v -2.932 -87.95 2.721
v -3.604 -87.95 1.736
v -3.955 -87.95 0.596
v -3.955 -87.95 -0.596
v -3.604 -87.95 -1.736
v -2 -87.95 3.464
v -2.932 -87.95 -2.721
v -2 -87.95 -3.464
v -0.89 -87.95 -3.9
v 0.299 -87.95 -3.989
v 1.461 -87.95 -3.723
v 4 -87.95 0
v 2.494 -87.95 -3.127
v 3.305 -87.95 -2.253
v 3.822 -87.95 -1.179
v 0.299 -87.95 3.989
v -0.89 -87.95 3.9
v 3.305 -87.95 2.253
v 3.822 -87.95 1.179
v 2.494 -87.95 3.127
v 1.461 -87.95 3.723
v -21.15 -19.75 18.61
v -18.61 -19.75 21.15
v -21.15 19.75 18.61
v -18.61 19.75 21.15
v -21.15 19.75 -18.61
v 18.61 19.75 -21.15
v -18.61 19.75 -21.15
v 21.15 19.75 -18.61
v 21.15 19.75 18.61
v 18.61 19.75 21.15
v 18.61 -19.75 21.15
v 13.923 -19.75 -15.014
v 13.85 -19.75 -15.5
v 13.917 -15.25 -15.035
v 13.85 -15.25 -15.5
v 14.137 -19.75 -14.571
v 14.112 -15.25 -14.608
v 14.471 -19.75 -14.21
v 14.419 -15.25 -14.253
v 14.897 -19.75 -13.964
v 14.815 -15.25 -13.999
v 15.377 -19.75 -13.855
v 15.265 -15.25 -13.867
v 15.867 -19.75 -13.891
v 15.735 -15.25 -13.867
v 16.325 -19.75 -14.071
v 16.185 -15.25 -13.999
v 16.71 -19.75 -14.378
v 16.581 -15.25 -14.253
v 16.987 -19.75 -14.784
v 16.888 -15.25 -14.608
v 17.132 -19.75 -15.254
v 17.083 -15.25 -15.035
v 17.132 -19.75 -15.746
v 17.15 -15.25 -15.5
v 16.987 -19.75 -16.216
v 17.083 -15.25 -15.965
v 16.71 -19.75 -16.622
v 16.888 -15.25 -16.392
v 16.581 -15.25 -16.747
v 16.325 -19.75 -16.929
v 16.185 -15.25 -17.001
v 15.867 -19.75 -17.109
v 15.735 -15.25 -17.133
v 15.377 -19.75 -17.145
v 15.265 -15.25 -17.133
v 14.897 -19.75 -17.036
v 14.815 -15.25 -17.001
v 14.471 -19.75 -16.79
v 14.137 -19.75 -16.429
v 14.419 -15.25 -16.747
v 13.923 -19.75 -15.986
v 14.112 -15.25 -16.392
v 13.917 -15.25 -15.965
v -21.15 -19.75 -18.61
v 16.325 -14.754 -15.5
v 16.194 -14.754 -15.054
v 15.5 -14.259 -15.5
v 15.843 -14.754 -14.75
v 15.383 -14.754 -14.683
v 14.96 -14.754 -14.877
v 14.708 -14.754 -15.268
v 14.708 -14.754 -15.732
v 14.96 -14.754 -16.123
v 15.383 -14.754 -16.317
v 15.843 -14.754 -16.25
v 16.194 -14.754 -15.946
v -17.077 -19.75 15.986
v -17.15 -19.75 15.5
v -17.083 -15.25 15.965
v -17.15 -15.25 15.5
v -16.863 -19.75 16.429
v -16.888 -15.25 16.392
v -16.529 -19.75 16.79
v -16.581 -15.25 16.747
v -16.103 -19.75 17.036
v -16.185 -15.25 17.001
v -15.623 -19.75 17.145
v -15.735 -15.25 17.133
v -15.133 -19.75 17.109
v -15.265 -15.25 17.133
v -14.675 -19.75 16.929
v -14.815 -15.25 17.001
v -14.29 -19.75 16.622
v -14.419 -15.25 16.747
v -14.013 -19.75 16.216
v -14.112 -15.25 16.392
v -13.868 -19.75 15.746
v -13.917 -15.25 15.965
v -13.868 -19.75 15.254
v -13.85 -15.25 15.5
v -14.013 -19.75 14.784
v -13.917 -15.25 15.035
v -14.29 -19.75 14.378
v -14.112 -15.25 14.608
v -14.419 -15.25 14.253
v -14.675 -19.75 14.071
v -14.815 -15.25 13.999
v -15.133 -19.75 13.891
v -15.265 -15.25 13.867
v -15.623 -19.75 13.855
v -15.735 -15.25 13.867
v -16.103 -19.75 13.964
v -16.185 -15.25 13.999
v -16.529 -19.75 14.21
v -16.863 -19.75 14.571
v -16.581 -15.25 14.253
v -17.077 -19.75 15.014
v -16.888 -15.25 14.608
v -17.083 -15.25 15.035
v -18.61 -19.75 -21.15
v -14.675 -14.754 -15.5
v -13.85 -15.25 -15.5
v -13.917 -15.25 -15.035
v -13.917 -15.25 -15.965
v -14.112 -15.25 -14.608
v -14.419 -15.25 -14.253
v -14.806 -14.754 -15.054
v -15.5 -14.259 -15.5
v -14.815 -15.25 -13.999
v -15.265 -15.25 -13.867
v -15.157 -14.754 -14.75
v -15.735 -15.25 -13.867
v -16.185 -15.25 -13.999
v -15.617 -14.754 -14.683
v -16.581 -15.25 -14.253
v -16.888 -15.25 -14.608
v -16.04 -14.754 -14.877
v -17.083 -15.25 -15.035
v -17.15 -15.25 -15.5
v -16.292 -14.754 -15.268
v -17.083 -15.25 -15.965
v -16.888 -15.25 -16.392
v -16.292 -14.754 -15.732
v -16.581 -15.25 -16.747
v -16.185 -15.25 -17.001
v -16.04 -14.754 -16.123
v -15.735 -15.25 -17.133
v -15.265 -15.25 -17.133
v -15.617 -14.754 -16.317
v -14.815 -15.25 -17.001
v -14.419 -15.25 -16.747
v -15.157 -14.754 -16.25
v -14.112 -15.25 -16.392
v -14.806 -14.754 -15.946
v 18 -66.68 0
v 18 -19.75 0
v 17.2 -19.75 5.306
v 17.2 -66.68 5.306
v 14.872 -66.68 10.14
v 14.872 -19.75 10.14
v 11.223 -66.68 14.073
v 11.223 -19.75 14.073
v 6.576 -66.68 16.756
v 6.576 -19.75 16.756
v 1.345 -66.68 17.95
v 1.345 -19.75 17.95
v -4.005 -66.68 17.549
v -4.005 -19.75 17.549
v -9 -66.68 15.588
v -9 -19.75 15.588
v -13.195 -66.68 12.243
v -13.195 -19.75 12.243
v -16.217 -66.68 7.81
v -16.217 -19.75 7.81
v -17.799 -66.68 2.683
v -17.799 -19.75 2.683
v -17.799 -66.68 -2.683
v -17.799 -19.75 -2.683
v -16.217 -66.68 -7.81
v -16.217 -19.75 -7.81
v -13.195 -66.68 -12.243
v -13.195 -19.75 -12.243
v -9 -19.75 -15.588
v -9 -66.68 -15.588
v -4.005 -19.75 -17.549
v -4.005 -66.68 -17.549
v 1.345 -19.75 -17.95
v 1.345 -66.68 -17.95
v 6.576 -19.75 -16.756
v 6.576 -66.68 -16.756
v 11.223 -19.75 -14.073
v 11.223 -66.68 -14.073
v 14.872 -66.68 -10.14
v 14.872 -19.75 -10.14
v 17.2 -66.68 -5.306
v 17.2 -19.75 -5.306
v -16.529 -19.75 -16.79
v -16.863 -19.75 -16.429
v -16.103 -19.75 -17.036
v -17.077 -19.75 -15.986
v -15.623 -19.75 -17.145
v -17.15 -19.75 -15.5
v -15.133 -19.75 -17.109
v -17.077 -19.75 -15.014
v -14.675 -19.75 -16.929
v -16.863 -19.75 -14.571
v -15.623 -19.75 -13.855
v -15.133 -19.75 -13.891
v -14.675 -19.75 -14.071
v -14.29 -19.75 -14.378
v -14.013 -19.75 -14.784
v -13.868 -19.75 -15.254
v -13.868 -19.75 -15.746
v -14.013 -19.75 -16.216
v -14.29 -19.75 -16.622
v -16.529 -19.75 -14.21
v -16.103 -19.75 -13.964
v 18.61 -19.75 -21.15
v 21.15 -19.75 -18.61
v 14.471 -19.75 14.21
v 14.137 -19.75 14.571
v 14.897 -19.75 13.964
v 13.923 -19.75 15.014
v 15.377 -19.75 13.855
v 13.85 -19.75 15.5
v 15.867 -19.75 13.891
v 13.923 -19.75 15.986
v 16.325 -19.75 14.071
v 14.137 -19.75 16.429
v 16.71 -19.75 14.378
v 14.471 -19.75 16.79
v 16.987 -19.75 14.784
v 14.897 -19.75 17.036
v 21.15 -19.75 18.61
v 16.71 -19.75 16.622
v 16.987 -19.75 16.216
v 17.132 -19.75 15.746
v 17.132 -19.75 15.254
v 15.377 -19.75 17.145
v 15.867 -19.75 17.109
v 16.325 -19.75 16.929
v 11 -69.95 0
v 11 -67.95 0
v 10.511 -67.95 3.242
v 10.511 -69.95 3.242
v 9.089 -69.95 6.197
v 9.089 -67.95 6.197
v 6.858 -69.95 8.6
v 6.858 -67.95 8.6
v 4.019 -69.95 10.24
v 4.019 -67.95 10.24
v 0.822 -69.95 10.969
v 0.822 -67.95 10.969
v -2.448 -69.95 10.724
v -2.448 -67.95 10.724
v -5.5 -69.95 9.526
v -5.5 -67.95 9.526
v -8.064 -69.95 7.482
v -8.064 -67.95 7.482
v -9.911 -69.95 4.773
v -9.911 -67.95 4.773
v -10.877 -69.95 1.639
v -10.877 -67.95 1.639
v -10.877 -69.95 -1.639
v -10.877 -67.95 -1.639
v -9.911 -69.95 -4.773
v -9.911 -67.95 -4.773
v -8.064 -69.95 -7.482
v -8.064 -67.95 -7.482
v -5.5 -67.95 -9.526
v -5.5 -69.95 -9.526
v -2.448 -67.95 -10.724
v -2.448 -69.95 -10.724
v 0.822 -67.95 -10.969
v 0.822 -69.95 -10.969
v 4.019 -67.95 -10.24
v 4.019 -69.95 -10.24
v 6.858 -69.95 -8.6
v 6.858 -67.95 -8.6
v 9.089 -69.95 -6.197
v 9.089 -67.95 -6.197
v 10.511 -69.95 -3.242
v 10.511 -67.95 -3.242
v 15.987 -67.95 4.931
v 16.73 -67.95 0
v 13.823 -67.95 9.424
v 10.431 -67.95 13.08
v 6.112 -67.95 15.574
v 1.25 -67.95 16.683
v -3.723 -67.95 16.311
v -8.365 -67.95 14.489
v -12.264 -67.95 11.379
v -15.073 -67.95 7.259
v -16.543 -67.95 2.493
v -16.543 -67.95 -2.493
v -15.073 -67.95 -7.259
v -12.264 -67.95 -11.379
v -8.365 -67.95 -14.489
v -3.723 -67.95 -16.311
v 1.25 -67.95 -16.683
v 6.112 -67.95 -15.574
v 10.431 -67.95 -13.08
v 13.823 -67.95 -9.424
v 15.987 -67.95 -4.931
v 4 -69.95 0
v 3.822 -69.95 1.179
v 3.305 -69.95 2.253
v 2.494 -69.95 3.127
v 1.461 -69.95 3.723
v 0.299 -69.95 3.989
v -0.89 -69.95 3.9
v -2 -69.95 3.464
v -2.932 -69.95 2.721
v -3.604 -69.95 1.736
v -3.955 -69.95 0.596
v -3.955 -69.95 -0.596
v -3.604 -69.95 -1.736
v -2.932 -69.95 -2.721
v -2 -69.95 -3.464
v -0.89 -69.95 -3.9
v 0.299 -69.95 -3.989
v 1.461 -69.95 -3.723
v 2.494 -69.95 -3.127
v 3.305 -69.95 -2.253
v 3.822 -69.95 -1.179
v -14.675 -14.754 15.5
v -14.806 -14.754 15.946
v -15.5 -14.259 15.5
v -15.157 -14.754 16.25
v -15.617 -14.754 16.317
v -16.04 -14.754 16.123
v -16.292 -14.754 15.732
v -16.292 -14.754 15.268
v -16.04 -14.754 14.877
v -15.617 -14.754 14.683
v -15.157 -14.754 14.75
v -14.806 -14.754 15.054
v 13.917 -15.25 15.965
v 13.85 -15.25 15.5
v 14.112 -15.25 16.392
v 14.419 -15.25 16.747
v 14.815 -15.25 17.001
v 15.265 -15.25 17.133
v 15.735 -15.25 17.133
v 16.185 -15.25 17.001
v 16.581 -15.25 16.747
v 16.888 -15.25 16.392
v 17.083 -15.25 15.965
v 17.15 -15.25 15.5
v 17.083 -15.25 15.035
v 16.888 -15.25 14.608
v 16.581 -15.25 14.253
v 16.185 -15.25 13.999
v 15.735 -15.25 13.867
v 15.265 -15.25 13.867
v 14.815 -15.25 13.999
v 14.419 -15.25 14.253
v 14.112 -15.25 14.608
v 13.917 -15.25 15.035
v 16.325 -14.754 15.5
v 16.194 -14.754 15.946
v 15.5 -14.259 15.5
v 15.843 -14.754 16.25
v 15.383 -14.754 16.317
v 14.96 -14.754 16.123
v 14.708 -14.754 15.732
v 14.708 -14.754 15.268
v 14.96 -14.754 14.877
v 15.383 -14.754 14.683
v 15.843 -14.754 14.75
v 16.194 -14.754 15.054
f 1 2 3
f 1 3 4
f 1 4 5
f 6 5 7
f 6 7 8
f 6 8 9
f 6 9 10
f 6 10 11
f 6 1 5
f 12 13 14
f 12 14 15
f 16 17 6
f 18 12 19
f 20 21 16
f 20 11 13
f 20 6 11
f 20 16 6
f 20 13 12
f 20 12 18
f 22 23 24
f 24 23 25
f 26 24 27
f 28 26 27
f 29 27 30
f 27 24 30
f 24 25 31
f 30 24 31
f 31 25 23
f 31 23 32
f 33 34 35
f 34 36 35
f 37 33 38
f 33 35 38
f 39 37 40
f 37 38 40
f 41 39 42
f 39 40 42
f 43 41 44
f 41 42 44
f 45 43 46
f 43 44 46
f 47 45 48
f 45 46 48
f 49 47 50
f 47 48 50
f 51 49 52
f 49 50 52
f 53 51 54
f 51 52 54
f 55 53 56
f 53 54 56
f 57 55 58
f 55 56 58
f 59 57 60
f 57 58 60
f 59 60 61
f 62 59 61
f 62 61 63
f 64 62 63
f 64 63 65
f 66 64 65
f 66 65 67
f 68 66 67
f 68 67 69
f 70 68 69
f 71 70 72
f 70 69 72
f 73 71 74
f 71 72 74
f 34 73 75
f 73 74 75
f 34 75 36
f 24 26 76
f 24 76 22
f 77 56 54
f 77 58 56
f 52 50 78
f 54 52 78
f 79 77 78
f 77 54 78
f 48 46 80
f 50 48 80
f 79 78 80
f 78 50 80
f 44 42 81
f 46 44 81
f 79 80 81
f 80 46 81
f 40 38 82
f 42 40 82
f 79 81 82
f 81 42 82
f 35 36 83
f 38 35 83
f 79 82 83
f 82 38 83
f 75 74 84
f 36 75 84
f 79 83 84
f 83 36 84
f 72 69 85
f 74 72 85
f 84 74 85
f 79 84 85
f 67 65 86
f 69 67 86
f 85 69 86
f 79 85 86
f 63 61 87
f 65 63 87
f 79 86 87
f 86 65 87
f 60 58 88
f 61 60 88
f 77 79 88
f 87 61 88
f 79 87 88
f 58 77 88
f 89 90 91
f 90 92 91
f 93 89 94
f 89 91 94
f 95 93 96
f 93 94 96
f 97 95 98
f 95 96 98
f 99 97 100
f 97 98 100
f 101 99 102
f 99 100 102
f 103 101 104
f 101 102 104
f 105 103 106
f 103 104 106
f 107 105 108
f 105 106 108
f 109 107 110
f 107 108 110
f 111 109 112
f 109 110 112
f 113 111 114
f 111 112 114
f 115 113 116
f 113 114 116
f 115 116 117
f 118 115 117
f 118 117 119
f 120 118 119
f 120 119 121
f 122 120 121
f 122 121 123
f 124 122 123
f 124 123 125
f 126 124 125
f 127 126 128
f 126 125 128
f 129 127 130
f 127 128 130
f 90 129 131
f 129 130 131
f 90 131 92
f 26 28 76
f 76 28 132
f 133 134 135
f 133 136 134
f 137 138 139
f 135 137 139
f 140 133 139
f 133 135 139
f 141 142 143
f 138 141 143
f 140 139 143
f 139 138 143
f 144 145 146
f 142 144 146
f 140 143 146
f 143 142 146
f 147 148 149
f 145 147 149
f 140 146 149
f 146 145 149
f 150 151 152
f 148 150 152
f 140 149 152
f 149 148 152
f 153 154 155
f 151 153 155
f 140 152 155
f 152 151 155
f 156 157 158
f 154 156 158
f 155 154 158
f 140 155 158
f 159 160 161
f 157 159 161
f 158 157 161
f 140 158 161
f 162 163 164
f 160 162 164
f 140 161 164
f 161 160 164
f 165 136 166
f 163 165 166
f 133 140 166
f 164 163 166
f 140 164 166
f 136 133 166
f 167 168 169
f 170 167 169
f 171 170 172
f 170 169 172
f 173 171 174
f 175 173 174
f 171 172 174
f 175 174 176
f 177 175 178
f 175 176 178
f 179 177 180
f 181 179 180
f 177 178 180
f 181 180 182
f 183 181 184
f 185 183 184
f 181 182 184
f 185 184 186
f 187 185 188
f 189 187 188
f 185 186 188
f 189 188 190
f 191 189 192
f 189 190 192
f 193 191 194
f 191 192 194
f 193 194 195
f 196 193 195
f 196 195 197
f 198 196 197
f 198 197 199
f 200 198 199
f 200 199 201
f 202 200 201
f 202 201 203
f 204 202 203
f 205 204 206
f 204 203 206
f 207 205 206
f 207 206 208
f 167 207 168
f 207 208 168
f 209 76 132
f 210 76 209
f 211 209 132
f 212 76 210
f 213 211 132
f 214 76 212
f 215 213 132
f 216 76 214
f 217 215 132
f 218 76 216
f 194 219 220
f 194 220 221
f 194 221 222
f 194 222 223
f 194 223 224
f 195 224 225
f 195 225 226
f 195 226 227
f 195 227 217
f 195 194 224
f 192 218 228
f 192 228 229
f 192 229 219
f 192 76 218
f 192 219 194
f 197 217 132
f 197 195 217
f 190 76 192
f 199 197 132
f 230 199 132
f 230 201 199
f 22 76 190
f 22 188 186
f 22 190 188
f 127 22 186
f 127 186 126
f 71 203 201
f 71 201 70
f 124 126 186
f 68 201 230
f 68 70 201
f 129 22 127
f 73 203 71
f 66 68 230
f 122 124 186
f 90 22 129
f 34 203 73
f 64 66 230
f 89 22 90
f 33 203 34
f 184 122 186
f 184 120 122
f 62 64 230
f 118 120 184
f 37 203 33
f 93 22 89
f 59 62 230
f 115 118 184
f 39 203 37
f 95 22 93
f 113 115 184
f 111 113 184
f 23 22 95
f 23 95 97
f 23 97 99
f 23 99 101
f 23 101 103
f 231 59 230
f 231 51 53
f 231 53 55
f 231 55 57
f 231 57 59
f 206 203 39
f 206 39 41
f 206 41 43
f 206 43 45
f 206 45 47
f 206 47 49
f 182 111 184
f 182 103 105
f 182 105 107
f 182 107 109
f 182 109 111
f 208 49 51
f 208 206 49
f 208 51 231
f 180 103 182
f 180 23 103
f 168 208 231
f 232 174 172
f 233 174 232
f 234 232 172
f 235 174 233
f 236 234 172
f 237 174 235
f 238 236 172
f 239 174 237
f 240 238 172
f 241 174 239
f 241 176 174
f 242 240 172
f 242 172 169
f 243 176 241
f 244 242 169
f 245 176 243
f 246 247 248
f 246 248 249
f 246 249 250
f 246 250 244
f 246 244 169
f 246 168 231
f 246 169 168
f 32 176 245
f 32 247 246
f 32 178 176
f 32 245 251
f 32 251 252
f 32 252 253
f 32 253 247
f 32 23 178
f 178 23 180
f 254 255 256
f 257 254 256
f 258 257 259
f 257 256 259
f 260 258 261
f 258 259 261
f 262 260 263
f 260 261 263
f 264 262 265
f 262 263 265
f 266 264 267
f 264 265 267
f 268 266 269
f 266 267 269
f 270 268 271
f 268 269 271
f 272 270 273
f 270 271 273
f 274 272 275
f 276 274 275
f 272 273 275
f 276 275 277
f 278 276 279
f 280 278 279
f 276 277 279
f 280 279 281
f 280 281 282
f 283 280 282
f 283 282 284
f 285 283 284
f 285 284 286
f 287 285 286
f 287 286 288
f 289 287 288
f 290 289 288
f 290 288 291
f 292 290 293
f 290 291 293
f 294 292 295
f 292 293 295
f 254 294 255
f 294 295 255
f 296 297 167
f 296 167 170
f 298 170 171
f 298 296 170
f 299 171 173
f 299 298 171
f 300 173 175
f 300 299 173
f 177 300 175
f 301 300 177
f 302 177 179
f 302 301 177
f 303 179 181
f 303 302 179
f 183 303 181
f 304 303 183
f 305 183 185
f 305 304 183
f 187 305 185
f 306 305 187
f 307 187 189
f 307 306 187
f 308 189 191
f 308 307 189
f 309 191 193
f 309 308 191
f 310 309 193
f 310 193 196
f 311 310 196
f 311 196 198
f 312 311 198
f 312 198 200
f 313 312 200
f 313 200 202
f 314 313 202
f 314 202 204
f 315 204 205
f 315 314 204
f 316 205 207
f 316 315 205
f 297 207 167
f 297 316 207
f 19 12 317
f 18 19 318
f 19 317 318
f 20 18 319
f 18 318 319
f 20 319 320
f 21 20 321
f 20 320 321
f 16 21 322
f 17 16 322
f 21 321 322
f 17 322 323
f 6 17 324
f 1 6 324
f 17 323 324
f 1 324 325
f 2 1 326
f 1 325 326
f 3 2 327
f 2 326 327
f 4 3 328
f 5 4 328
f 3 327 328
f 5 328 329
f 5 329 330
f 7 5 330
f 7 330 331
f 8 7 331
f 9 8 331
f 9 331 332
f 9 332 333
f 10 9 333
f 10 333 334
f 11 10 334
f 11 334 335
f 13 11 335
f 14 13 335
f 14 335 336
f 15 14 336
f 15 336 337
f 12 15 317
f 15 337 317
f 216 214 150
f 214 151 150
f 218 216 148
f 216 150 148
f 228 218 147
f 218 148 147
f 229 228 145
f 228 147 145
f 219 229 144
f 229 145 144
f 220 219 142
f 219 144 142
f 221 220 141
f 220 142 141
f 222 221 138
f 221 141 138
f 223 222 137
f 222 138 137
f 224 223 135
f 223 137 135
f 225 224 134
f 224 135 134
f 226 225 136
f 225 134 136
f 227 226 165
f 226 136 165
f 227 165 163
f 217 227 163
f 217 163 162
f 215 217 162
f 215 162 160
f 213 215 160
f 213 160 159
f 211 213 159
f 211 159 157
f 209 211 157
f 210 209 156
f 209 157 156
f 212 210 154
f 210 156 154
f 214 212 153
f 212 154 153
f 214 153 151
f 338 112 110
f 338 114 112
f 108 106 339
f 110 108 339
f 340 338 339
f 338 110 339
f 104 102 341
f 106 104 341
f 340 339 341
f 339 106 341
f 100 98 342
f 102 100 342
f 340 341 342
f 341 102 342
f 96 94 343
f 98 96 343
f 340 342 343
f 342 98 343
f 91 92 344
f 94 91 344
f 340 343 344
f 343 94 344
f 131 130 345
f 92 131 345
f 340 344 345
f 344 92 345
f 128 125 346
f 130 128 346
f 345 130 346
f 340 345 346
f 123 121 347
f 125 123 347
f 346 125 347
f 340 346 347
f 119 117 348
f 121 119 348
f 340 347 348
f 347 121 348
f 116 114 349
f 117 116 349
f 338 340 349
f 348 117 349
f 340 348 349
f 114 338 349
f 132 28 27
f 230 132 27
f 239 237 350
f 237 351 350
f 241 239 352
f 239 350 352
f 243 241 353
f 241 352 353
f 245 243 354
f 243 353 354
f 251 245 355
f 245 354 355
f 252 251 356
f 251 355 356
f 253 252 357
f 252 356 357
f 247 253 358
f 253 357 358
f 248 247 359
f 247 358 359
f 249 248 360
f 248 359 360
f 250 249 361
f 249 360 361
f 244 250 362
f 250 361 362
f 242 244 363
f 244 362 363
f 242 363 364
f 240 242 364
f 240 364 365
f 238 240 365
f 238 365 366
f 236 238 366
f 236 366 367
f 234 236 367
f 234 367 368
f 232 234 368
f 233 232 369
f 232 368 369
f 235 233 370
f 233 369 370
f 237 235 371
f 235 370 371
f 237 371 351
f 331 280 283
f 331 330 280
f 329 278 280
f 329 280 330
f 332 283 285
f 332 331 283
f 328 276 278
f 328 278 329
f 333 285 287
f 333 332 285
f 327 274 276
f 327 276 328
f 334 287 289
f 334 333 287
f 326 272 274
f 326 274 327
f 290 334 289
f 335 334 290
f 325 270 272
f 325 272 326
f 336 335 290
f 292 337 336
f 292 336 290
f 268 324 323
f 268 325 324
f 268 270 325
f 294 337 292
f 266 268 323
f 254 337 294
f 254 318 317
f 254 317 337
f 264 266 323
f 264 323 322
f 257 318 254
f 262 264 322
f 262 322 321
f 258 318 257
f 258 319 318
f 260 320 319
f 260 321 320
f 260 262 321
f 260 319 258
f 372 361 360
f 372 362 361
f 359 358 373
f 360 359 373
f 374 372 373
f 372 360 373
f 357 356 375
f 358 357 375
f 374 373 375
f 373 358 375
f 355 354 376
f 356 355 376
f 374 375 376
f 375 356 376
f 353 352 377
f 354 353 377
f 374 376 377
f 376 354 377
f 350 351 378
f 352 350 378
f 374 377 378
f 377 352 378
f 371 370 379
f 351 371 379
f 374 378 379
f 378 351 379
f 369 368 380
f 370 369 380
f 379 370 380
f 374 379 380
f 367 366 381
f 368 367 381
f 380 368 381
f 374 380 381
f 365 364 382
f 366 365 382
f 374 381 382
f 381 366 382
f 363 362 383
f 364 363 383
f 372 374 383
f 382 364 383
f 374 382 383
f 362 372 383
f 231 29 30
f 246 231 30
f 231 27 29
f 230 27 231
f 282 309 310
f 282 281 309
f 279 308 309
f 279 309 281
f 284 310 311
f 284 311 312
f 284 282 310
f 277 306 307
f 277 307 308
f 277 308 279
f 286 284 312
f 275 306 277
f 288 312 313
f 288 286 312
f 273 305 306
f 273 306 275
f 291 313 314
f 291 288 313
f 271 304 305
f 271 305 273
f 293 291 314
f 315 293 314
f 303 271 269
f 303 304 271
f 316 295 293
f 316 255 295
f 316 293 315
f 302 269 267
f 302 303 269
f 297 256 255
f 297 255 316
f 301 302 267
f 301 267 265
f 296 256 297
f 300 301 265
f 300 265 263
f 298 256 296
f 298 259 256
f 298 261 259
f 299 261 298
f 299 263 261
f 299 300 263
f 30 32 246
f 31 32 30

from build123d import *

# Parameters (mm, degrees)
F0_W      = 42.3
F0_H      = 42.3
F1_DEPTH  = 19.75
F2_SIZE   = 2.54
F4_D      = 3.3
F4_DEPTH  = 4.5
F4_TIP    = 0.9914200214
F5_R      = 18
F6_DEPTH  = 48.2
F7_R      = 11
F8_DEPTH  = 2
F9_R      = 4
F10_DEPTH = 18
F11_SIZE  = 1.27


with BuildPart() as f1:
    # F0 (on Front) → F1 (new body, symmetric)
    with BuildSketch(Plane.XZ):
        Rectangle(F0_W, F0_H)
    extrude(amount=F1_DEPTH, both=True)

    # F2
    f2_edges = [f1.edges().sort_by_distance(p)[0] for p in [
        (21.15, 0, 21.15),
        (-21.15, 0, 21.15),
        (-21.15, 0, -21.15),
        (21.15, 0, -21.15),
    ]]
    chamfer(f2_edges, length=F2_SIZE)

    # F4
    with Locations(Plane.XZ.offset(19.75)):
        with Locations((15.5, 15.5), (15.5, -15.5), (-15.5, -15.5), (-15.5, 15.5)):
            Hole(F4_D / 2, depth=F4_DEPTH)
            with Locations((0, 0, -(F4_DEPTH + F4_TIP / 2))):  # 118° drill point
                Cone(0, F4_D / 2, F4_TIP, mode=Mode.SUBTRACT)

    # F5 (on face) → F6 (join)
    with BuildSketch(Plane.XZ.offset(19.75)):
        Circle(F5_R)
    extrude(amount=F6_DEPTH)

    # F7 (on face) → F8 (join)
    with BuildSketch(Plane.XZ.offset(67.95)):
        Circle(F7_R)
    extrude(amount=F8_DEPTH)

    # F9 (on face) → F10 (join)
    with BuildSketch(Plane.XZ.offset(69.95)):
        Circle(F9_R)
    extrude(amount=F10_DEPTH)

    # F11
    f11_edges = [f1.edges().sort_by_distance(p)[0] for p in [
        (-18, -67.95, 0),
    ]]
    chamfer(f11_edges, length=F11_SIZE)


solid = f1.part
